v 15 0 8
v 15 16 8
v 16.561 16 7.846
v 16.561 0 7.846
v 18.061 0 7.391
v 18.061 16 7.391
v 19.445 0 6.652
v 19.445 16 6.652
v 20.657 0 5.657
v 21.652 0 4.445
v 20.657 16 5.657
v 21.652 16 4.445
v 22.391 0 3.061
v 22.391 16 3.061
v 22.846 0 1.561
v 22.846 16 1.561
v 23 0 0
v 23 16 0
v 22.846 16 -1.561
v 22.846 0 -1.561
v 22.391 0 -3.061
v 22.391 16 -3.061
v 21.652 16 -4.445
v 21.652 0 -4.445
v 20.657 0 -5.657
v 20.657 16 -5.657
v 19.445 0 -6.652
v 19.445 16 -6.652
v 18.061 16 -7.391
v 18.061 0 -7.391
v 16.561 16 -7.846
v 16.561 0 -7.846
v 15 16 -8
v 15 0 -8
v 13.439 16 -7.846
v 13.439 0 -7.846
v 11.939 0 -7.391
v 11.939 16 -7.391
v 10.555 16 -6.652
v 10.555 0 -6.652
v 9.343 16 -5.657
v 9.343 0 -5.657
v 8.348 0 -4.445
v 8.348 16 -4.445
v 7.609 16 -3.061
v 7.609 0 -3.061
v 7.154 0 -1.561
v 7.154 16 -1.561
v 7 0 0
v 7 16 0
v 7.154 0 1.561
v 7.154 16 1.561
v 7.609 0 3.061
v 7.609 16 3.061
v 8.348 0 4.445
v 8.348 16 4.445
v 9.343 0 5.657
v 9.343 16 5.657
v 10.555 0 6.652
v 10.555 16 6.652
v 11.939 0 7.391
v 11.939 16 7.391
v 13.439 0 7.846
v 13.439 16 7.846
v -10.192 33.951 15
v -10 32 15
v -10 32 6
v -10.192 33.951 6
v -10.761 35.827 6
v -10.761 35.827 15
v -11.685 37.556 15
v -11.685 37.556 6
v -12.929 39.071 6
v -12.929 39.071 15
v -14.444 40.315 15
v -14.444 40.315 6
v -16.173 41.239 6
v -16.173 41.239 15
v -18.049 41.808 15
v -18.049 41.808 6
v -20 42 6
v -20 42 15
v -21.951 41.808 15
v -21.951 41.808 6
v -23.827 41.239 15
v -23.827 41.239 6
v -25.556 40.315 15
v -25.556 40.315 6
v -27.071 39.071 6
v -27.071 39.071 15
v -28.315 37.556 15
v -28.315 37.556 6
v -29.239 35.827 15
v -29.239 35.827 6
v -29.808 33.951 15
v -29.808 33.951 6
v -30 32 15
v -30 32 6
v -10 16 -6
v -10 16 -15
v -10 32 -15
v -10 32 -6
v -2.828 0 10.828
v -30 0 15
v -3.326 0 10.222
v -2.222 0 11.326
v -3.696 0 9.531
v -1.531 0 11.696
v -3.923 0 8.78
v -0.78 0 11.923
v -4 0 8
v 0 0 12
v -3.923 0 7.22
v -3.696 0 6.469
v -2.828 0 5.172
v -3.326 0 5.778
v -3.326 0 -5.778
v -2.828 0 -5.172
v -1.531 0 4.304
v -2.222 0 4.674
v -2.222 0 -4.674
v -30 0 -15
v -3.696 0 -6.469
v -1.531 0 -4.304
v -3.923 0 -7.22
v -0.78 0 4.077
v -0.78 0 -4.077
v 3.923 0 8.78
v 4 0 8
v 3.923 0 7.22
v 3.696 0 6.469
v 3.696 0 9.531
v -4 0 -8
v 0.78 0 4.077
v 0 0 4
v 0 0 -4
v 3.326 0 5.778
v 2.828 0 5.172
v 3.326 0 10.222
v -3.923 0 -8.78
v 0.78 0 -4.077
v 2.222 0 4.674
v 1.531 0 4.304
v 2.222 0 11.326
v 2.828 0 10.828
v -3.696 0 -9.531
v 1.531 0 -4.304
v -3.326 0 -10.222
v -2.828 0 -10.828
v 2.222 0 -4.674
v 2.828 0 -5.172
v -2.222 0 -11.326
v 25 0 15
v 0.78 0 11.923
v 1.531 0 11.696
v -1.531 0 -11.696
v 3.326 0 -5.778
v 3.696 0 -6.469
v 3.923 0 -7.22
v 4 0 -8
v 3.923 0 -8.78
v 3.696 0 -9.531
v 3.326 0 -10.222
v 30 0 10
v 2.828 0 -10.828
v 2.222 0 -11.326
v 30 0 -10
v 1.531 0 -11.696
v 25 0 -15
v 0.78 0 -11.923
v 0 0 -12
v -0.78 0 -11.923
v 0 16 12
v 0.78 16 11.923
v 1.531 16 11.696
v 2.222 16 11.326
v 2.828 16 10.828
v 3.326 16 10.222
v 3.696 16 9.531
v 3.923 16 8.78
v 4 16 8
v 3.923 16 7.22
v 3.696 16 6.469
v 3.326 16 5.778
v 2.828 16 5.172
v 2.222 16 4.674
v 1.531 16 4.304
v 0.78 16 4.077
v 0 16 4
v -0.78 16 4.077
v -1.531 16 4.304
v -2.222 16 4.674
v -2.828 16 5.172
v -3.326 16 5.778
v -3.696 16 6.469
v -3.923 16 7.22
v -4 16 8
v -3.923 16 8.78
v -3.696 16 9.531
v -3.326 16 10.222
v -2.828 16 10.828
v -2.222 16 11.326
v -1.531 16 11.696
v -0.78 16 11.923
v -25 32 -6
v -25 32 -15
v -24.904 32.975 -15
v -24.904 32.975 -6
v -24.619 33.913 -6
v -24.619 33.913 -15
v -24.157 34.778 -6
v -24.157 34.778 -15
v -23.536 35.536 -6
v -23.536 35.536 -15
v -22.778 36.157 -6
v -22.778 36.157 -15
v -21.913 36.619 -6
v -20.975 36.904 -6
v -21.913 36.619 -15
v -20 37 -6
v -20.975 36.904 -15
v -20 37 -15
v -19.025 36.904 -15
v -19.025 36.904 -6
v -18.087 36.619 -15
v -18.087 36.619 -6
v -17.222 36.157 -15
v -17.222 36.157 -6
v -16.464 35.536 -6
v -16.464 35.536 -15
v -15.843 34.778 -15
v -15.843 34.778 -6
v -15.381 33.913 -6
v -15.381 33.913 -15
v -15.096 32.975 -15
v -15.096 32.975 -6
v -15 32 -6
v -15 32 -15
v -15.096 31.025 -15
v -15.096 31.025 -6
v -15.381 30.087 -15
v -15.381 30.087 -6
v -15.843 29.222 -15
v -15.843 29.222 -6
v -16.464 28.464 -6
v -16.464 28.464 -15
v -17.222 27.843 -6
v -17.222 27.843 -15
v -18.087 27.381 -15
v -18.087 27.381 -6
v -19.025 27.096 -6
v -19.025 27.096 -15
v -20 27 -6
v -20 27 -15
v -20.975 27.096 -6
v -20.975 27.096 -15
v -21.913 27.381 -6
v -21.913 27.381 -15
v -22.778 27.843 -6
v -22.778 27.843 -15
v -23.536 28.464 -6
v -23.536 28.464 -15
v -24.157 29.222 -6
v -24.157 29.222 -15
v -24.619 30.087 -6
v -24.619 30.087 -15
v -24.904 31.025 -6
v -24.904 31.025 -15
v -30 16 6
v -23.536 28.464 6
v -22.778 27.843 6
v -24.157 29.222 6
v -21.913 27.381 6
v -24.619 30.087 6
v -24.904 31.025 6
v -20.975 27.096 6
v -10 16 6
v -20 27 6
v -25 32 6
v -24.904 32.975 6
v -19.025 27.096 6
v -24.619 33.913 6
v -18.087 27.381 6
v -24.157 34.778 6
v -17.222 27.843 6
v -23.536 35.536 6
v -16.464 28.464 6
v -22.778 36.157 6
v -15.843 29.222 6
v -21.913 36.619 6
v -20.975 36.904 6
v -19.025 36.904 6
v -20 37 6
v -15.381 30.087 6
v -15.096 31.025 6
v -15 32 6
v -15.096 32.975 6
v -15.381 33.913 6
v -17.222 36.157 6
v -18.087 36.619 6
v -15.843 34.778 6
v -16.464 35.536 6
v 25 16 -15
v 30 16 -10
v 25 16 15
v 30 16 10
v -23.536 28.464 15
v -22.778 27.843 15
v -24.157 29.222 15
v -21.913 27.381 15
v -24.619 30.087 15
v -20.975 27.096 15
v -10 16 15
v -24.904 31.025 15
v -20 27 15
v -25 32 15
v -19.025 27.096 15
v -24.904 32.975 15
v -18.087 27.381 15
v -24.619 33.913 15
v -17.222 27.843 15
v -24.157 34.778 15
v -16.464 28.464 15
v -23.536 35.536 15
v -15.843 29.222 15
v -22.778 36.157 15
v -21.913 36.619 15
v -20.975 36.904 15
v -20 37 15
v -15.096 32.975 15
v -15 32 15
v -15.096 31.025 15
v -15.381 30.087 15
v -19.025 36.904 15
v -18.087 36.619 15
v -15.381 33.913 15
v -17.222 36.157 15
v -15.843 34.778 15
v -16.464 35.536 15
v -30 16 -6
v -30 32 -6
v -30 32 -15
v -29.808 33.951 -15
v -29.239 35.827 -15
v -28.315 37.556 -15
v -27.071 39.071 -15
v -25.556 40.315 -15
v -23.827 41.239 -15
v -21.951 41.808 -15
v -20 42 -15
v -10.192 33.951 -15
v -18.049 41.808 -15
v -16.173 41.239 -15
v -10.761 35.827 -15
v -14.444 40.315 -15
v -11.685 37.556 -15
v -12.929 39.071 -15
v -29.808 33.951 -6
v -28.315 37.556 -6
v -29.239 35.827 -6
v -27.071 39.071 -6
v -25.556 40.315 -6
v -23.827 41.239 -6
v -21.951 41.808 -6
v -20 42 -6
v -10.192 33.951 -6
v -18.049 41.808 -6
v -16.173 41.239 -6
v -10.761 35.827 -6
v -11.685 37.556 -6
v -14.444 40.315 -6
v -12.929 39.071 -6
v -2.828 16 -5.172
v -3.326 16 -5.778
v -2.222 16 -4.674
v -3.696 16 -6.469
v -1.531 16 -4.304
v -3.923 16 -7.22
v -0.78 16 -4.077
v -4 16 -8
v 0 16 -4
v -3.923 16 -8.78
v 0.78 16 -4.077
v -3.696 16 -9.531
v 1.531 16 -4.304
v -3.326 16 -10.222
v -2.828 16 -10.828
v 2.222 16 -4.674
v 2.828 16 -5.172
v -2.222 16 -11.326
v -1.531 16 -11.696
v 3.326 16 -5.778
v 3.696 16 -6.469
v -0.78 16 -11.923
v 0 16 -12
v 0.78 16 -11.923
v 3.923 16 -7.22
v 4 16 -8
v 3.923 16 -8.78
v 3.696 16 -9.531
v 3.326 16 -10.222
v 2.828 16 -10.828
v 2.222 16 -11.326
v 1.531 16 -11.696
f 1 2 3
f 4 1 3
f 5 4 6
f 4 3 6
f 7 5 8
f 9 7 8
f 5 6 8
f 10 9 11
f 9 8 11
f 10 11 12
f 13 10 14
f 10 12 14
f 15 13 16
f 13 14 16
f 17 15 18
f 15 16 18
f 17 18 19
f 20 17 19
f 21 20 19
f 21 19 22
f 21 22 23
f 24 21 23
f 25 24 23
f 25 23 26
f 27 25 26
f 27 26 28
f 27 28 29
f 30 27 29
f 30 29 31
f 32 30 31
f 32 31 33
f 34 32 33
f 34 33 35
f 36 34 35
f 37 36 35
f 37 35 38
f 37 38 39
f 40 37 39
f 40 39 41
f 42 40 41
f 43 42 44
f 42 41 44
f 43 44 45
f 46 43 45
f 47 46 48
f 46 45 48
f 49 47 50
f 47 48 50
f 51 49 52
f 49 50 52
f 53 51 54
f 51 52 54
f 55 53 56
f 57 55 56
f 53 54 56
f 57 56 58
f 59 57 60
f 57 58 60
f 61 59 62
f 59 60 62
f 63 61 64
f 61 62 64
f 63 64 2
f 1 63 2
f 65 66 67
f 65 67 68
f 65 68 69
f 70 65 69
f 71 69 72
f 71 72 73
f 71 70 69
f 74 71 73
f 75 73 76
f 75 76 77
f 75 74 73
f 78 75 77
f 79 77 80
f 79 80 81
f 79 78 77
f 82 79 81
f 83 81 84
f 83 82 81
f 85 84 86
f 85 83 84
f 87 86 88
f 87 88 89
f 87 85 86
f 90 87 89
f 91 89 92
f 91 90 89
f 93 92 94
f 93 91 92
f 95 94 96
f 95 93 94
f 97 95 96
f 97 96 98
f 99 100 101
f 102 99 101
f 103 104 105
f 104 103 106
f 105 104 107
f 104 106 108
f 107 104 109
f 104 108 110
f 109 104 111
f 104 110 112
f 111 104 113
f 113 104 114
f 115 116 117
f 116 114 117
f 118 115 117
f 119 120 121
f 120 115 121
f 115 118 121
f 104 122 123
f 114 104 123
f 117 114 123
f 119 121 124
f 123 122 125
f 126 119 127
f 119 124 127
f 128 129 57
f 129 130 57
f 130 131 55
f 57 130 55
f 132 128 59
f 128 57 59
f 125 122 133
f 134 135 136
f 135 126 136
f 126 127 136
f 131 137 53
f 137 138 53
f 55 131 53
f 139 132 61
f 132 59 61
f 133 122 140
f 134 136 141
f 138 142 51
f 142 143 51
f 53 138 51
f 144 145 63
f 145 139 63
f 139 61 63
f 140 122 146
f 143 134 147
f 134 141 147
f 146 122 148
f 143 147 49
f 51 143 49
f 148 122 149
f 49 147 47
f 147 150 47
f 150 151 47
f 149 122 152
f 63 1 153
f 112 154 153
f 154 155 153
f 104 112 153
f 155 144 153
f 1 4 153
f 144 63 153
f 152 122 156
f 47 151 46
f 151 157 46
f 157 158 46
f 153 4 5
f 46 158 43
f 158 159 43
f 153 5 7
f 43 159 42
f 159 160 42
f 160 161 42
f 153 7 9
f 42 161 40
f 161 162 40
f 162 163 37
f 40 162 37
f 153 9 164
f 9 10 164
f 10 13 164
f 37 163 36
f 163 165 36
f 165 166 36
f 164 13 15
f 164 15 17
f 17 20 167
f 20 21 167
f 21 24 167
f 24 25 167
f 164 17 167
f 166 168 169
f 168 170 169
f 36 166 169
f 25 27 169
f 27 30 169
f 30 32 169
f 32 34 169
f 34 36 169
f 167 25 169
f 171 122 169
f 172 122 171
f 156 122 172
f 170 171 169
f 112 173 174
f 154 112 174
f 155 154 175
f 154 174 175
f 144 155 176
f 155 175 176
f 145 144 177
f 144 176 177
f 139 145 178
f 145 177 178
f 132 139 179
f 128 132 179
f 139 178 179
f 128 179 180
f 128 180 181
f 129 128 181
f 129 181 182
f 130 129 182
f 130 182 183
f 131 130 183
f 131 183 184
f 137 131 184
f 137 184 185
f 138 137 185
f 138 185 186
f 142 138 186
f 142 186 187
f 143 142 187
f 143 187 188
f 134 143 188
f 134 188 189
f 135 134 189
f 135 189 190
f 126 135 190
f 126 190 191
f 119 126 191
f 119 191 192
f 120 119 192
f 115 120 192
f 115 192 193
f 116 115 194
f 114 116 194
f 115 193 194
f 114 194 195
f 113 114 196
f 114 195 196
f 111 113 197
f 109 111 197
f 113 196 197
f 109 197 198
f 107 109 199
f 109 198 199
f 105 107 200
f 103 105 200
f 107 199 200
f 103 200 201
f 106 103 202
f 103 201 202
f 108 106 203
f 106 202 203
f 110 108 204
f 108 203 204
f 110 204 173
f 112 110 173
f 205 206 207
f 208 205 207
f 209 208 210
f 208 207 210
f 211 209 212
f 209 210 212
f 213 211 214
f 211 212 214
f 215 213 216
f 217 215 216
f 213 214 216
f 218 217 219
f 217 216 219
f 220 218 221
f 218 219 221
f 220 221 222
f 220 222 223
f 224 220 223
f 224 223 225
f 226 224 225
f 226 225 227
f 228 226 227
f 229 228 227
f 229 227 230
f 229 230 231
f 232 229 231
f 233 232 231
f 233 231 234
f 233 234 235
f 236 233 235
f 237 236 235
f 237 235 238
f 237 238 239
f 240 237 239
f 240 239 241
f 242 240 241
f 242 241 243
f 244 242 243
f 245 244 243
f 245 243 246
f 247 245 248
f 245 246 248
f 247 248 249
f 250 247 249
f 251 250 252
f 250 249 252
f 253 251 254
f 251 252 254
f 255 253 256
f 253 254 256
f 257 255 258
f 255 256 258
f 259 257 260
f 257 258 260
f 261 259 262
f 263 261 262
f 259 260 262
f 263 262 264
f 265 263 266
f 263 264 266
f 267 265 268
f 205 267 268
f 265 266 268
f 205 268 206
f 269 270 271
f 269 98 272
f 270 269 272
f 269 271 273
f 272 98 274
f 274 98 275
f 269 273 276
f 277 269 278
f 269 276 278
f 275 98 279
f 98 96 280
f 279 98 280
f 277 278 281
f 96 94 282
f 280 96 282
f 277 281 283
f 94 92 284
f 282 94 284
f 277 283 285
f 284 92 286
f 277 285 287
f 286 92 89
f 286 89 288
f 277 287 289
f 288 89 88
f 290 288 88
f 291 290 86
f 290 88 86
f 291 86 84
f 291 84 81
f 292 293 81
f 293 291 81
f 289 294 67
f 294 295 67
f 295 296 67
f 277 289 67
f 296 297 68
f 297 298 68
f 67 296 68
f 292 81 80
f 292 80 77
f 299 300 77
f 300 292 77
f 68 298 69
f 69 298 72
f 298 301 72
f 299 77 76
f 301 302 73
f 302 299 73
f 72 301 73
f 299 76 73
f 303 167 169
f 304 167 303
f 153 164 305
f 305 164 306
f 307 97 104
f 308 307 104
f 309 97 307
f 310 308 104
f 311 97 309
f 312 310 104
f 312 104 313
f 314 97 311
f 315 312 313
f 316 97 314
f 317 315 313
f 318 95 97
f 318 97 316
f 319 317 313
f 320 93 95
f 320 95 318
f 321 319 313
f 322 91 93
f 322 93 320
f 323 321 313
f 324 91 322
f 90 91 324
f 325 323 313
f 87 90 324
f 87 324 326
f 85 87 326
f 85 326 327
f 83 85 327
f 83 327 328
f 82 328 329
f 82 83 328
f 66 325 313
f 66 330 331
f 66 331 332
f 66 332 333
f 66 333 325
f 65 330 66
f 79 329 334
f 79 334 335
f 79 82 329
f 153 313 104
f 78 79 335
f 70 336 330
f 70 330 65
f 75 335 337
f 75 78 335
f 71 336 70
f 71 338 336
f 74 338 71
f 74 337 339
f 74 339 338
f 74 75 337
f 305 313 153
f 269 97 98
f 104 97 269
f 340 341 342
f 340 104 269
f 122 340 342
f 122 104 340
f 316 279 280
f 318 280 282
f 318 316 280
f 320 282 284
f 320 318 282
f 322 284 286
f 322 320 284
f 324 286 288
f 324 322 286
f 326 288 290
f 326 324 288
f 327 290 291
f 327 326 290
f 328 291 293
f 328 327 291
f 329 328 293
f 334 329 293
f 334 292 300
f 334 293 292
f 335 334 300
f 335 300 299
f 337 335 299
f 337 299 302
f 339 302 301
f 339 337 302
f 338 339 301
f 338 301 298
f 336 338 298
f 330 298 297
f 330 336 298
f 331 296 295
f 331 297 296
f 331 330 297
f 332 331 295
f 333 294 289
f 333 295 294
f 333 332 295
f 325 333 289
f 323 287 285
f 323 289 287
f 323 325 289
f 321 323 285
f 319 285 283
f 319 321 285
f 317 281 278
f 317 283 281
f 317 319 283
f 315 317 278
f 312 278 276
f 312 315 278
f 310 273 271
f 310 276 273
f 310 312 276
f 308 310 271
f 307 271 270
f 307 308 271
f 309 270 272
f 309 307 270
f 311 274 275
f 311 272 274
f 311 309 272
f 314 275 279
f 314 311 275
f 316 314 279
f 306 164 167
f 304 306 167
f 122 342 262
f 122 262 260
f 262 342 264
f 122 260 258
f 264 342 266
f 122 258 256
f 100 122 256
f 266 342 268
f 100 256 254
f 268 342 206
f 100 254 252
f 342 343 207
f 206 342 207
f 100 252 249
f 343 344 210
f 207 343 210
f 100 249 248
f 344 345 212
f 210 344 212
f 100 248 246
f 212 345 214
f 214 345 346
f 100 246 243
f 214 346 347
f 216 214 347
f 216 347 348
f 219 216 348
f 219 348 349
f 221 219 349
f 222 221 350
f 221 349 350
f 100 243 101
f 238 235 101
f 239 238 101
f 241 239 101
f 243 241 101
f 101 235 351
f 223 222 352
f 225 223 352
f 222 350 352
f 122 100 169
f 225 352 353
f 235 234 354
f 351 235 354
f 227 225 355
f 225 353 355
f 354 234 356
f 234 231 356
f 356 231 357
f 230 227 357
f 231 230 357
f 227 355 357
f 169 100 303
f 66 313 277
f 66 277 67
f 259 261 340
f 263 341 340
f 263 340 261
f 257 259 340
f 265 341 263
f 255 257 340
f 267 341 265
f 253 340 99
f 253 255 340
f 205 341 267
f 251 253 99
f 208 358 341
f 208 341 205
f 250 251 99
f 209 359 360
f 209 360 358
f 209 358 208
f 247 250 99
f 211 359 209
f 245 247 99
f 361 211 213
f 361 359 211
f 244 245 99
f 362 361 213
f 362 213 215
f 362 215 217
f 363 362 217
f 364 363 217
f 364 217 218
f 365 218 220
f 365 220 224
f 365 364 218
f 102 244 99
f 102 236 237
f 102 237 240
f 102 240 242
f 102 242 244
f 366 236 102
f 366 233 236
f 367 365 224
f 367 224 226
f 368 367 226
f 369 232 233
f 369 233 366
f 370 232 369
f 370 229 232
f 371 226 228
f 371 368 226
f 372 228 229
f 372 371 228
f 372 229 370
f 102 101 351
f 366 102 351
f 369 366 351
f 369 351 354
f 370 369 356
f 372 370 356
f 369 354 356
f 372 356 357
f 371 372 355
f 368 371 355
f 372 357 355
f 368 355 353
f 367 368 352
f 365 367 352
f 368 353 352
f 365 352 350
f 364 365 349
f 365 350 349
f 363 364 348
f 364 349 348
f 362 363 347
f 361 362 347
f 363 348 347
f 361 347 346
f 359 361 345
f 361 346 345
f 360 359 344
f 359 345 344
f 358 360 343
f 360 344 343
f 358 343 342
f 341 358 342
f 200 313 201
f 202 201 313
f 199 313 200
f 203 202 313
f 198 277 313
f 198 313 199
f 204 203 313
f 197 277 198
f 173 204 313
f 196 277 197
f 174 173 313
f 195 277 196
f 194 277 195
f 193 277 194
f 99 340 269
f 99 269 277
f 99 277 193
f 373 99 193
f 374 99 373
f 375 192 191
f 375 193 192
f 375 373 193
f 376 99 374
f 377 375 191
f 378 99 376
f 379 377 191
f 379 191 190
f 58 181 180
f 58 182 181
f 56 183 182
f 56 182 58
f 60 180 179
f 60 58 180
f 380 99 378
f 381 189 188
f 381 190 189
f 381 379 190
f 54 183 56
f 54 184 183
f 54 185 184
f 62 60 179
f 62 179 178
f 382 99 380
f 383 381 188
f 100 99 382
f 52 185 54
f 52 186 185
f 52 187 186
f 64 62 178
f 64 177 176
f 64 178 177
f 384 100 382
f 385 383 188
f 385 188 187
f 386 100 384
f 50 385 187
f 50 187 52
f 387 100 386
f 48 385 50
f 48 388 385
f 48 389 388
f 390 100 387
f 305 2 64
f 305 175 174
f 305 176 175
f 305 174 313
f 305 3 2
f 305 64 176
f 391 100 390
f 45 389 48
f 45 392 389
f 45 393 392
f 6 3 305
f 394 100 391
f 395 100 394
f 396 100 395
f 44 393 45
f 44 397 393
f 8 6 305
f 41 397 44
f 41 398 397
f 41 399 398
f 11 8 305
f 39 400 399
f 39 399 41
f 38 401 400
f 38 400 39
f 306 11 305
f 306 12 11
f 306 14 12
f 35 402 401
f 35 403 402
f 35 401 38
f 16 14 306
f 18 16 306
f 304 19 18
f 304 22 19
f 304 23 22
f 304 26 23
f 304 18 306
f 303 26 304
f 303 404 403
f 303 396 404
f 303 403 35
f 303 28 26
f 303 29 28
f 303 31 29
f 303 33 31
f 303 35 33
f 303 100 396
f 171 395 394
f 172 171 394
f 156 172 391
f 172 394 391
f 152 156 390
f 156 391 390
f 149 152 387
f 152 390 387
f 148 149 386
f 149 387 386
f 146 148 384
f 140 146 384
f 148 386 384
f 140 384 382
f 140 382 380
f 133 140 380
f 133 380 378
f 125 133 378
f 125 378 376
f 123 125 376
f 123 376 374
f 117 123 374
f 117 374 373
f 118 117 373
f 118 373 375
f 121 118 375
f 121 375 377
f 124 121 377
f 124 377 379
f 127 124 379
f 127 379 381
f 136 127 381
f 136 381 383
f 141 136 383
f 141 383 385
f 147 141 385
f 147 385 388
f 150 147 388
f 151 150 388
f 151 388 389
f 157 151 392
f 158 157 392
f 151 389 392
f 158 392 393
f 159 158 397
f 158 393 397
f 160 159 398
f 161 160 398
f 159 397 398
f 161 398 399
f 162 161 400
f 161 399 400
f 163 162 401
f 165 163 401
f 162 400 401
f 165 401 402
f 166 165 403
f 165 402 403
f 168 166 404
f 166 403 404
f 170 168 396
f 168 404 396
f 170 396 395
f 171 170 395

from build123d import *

# Parameters (mm, degrees)
SKETCH2_W           = 60
SKETCH2_H           = 30
BOSS_EXTRUDE1_DEPTH = 16
BOSS_EXTRUDE2_DEPTH = 9
SKETCH4_R           = 5
CUT_EXTRUDE1_DEPTH  = 60.699246226
SKETCH5_R           = 8
SKETCH5_R_2         = 4
CUT_EXTRUDE2_DEPTH  = 43.438190348
CHAMFER1_SIZE       = 5


with BuildPart() as part:
    # Sketch2 → Boss-Extrude1 (new body)
    with BuildSketch(Plane(origin=(0, 0, 0), x_dir=(1, 0, 0), z_dir=(0, 1, 0))):
        Rectangle(SKETCH2_W, SKETCH2_H)
    extrude(amount=BOSS_EXTRUDE1_DEPTH)

    # Sketch3 → Boss-Extrude2 (add)
    with BuildSketch(Plane(origin=(0, 0, -15), x_dir=(-1, 0, 0), z_dir=(0, 0, -1))):
        with BuildLine():
            Line((30, 16), (10, 16))
            Line((10, 16), (10, 32))
            ThreePointArc((10, 32), (20, 42), (30, 32))
            Line((30, 32), (30, 16))
        make_face()
    boss_extrude2 = extrude(amount=-BOSS_EXTRUDE2_DEPTH)

    # Sketch4 → Cut-Extrude1 (cut, through all)
    with BuildSketch(Plane(origin=(0, 0, -15), x_dir=(-1, 0, 0), z_dir=(0, 0, -1))):
        with Locations((20, 32)):
            Circle(SKETCH4_R)
    cut_extrude1 = extrude(amount=-CUT_EXTRUDE1_DEPTH, mode=Mode.SUBTRACT)

    # Mirror1: Boss-Extrude2, Cut-Extrude1 across plane
    add(boss_extrude2.mirror(Plane.XY))
    add(cut_extrude1.mirror(Plane.XY), mode=Mode.SUBTRACT)

    # Sketch5 → Cut-Extrude2 (cut, through all)
    with BuildSketch(Plane(origin=(0, 16, 0), x_dir=(1, 0, 0), z_dir=(0, 1, 0))):
        with Locations(Location((15, 0, 0), (0, 0, 270))):
            Circle(SKETCH5_R)
        with Locations(Location((0, -8, 0), (0, 0, 270))):
            Circle(SKETCH5_R_2)
        with Locations(Location((0, 8, 0), (0, 0, 90))):
            Circle(SKETCH5_R_2)
    extrude(amount=-CUT_EXTRUDE2_DEPTH, mode=Mode.SUBTRACT)

    # Chamfer1
    chamfer1_edges = [part.edges().sort_by_distance(p)[0] for p in [
        (30, 8, 15),
        (30, 8, -15),
    ]]
    chamfer(chamfer1_edges, length=CHAMFER1_SIZE)


solid = part.part
